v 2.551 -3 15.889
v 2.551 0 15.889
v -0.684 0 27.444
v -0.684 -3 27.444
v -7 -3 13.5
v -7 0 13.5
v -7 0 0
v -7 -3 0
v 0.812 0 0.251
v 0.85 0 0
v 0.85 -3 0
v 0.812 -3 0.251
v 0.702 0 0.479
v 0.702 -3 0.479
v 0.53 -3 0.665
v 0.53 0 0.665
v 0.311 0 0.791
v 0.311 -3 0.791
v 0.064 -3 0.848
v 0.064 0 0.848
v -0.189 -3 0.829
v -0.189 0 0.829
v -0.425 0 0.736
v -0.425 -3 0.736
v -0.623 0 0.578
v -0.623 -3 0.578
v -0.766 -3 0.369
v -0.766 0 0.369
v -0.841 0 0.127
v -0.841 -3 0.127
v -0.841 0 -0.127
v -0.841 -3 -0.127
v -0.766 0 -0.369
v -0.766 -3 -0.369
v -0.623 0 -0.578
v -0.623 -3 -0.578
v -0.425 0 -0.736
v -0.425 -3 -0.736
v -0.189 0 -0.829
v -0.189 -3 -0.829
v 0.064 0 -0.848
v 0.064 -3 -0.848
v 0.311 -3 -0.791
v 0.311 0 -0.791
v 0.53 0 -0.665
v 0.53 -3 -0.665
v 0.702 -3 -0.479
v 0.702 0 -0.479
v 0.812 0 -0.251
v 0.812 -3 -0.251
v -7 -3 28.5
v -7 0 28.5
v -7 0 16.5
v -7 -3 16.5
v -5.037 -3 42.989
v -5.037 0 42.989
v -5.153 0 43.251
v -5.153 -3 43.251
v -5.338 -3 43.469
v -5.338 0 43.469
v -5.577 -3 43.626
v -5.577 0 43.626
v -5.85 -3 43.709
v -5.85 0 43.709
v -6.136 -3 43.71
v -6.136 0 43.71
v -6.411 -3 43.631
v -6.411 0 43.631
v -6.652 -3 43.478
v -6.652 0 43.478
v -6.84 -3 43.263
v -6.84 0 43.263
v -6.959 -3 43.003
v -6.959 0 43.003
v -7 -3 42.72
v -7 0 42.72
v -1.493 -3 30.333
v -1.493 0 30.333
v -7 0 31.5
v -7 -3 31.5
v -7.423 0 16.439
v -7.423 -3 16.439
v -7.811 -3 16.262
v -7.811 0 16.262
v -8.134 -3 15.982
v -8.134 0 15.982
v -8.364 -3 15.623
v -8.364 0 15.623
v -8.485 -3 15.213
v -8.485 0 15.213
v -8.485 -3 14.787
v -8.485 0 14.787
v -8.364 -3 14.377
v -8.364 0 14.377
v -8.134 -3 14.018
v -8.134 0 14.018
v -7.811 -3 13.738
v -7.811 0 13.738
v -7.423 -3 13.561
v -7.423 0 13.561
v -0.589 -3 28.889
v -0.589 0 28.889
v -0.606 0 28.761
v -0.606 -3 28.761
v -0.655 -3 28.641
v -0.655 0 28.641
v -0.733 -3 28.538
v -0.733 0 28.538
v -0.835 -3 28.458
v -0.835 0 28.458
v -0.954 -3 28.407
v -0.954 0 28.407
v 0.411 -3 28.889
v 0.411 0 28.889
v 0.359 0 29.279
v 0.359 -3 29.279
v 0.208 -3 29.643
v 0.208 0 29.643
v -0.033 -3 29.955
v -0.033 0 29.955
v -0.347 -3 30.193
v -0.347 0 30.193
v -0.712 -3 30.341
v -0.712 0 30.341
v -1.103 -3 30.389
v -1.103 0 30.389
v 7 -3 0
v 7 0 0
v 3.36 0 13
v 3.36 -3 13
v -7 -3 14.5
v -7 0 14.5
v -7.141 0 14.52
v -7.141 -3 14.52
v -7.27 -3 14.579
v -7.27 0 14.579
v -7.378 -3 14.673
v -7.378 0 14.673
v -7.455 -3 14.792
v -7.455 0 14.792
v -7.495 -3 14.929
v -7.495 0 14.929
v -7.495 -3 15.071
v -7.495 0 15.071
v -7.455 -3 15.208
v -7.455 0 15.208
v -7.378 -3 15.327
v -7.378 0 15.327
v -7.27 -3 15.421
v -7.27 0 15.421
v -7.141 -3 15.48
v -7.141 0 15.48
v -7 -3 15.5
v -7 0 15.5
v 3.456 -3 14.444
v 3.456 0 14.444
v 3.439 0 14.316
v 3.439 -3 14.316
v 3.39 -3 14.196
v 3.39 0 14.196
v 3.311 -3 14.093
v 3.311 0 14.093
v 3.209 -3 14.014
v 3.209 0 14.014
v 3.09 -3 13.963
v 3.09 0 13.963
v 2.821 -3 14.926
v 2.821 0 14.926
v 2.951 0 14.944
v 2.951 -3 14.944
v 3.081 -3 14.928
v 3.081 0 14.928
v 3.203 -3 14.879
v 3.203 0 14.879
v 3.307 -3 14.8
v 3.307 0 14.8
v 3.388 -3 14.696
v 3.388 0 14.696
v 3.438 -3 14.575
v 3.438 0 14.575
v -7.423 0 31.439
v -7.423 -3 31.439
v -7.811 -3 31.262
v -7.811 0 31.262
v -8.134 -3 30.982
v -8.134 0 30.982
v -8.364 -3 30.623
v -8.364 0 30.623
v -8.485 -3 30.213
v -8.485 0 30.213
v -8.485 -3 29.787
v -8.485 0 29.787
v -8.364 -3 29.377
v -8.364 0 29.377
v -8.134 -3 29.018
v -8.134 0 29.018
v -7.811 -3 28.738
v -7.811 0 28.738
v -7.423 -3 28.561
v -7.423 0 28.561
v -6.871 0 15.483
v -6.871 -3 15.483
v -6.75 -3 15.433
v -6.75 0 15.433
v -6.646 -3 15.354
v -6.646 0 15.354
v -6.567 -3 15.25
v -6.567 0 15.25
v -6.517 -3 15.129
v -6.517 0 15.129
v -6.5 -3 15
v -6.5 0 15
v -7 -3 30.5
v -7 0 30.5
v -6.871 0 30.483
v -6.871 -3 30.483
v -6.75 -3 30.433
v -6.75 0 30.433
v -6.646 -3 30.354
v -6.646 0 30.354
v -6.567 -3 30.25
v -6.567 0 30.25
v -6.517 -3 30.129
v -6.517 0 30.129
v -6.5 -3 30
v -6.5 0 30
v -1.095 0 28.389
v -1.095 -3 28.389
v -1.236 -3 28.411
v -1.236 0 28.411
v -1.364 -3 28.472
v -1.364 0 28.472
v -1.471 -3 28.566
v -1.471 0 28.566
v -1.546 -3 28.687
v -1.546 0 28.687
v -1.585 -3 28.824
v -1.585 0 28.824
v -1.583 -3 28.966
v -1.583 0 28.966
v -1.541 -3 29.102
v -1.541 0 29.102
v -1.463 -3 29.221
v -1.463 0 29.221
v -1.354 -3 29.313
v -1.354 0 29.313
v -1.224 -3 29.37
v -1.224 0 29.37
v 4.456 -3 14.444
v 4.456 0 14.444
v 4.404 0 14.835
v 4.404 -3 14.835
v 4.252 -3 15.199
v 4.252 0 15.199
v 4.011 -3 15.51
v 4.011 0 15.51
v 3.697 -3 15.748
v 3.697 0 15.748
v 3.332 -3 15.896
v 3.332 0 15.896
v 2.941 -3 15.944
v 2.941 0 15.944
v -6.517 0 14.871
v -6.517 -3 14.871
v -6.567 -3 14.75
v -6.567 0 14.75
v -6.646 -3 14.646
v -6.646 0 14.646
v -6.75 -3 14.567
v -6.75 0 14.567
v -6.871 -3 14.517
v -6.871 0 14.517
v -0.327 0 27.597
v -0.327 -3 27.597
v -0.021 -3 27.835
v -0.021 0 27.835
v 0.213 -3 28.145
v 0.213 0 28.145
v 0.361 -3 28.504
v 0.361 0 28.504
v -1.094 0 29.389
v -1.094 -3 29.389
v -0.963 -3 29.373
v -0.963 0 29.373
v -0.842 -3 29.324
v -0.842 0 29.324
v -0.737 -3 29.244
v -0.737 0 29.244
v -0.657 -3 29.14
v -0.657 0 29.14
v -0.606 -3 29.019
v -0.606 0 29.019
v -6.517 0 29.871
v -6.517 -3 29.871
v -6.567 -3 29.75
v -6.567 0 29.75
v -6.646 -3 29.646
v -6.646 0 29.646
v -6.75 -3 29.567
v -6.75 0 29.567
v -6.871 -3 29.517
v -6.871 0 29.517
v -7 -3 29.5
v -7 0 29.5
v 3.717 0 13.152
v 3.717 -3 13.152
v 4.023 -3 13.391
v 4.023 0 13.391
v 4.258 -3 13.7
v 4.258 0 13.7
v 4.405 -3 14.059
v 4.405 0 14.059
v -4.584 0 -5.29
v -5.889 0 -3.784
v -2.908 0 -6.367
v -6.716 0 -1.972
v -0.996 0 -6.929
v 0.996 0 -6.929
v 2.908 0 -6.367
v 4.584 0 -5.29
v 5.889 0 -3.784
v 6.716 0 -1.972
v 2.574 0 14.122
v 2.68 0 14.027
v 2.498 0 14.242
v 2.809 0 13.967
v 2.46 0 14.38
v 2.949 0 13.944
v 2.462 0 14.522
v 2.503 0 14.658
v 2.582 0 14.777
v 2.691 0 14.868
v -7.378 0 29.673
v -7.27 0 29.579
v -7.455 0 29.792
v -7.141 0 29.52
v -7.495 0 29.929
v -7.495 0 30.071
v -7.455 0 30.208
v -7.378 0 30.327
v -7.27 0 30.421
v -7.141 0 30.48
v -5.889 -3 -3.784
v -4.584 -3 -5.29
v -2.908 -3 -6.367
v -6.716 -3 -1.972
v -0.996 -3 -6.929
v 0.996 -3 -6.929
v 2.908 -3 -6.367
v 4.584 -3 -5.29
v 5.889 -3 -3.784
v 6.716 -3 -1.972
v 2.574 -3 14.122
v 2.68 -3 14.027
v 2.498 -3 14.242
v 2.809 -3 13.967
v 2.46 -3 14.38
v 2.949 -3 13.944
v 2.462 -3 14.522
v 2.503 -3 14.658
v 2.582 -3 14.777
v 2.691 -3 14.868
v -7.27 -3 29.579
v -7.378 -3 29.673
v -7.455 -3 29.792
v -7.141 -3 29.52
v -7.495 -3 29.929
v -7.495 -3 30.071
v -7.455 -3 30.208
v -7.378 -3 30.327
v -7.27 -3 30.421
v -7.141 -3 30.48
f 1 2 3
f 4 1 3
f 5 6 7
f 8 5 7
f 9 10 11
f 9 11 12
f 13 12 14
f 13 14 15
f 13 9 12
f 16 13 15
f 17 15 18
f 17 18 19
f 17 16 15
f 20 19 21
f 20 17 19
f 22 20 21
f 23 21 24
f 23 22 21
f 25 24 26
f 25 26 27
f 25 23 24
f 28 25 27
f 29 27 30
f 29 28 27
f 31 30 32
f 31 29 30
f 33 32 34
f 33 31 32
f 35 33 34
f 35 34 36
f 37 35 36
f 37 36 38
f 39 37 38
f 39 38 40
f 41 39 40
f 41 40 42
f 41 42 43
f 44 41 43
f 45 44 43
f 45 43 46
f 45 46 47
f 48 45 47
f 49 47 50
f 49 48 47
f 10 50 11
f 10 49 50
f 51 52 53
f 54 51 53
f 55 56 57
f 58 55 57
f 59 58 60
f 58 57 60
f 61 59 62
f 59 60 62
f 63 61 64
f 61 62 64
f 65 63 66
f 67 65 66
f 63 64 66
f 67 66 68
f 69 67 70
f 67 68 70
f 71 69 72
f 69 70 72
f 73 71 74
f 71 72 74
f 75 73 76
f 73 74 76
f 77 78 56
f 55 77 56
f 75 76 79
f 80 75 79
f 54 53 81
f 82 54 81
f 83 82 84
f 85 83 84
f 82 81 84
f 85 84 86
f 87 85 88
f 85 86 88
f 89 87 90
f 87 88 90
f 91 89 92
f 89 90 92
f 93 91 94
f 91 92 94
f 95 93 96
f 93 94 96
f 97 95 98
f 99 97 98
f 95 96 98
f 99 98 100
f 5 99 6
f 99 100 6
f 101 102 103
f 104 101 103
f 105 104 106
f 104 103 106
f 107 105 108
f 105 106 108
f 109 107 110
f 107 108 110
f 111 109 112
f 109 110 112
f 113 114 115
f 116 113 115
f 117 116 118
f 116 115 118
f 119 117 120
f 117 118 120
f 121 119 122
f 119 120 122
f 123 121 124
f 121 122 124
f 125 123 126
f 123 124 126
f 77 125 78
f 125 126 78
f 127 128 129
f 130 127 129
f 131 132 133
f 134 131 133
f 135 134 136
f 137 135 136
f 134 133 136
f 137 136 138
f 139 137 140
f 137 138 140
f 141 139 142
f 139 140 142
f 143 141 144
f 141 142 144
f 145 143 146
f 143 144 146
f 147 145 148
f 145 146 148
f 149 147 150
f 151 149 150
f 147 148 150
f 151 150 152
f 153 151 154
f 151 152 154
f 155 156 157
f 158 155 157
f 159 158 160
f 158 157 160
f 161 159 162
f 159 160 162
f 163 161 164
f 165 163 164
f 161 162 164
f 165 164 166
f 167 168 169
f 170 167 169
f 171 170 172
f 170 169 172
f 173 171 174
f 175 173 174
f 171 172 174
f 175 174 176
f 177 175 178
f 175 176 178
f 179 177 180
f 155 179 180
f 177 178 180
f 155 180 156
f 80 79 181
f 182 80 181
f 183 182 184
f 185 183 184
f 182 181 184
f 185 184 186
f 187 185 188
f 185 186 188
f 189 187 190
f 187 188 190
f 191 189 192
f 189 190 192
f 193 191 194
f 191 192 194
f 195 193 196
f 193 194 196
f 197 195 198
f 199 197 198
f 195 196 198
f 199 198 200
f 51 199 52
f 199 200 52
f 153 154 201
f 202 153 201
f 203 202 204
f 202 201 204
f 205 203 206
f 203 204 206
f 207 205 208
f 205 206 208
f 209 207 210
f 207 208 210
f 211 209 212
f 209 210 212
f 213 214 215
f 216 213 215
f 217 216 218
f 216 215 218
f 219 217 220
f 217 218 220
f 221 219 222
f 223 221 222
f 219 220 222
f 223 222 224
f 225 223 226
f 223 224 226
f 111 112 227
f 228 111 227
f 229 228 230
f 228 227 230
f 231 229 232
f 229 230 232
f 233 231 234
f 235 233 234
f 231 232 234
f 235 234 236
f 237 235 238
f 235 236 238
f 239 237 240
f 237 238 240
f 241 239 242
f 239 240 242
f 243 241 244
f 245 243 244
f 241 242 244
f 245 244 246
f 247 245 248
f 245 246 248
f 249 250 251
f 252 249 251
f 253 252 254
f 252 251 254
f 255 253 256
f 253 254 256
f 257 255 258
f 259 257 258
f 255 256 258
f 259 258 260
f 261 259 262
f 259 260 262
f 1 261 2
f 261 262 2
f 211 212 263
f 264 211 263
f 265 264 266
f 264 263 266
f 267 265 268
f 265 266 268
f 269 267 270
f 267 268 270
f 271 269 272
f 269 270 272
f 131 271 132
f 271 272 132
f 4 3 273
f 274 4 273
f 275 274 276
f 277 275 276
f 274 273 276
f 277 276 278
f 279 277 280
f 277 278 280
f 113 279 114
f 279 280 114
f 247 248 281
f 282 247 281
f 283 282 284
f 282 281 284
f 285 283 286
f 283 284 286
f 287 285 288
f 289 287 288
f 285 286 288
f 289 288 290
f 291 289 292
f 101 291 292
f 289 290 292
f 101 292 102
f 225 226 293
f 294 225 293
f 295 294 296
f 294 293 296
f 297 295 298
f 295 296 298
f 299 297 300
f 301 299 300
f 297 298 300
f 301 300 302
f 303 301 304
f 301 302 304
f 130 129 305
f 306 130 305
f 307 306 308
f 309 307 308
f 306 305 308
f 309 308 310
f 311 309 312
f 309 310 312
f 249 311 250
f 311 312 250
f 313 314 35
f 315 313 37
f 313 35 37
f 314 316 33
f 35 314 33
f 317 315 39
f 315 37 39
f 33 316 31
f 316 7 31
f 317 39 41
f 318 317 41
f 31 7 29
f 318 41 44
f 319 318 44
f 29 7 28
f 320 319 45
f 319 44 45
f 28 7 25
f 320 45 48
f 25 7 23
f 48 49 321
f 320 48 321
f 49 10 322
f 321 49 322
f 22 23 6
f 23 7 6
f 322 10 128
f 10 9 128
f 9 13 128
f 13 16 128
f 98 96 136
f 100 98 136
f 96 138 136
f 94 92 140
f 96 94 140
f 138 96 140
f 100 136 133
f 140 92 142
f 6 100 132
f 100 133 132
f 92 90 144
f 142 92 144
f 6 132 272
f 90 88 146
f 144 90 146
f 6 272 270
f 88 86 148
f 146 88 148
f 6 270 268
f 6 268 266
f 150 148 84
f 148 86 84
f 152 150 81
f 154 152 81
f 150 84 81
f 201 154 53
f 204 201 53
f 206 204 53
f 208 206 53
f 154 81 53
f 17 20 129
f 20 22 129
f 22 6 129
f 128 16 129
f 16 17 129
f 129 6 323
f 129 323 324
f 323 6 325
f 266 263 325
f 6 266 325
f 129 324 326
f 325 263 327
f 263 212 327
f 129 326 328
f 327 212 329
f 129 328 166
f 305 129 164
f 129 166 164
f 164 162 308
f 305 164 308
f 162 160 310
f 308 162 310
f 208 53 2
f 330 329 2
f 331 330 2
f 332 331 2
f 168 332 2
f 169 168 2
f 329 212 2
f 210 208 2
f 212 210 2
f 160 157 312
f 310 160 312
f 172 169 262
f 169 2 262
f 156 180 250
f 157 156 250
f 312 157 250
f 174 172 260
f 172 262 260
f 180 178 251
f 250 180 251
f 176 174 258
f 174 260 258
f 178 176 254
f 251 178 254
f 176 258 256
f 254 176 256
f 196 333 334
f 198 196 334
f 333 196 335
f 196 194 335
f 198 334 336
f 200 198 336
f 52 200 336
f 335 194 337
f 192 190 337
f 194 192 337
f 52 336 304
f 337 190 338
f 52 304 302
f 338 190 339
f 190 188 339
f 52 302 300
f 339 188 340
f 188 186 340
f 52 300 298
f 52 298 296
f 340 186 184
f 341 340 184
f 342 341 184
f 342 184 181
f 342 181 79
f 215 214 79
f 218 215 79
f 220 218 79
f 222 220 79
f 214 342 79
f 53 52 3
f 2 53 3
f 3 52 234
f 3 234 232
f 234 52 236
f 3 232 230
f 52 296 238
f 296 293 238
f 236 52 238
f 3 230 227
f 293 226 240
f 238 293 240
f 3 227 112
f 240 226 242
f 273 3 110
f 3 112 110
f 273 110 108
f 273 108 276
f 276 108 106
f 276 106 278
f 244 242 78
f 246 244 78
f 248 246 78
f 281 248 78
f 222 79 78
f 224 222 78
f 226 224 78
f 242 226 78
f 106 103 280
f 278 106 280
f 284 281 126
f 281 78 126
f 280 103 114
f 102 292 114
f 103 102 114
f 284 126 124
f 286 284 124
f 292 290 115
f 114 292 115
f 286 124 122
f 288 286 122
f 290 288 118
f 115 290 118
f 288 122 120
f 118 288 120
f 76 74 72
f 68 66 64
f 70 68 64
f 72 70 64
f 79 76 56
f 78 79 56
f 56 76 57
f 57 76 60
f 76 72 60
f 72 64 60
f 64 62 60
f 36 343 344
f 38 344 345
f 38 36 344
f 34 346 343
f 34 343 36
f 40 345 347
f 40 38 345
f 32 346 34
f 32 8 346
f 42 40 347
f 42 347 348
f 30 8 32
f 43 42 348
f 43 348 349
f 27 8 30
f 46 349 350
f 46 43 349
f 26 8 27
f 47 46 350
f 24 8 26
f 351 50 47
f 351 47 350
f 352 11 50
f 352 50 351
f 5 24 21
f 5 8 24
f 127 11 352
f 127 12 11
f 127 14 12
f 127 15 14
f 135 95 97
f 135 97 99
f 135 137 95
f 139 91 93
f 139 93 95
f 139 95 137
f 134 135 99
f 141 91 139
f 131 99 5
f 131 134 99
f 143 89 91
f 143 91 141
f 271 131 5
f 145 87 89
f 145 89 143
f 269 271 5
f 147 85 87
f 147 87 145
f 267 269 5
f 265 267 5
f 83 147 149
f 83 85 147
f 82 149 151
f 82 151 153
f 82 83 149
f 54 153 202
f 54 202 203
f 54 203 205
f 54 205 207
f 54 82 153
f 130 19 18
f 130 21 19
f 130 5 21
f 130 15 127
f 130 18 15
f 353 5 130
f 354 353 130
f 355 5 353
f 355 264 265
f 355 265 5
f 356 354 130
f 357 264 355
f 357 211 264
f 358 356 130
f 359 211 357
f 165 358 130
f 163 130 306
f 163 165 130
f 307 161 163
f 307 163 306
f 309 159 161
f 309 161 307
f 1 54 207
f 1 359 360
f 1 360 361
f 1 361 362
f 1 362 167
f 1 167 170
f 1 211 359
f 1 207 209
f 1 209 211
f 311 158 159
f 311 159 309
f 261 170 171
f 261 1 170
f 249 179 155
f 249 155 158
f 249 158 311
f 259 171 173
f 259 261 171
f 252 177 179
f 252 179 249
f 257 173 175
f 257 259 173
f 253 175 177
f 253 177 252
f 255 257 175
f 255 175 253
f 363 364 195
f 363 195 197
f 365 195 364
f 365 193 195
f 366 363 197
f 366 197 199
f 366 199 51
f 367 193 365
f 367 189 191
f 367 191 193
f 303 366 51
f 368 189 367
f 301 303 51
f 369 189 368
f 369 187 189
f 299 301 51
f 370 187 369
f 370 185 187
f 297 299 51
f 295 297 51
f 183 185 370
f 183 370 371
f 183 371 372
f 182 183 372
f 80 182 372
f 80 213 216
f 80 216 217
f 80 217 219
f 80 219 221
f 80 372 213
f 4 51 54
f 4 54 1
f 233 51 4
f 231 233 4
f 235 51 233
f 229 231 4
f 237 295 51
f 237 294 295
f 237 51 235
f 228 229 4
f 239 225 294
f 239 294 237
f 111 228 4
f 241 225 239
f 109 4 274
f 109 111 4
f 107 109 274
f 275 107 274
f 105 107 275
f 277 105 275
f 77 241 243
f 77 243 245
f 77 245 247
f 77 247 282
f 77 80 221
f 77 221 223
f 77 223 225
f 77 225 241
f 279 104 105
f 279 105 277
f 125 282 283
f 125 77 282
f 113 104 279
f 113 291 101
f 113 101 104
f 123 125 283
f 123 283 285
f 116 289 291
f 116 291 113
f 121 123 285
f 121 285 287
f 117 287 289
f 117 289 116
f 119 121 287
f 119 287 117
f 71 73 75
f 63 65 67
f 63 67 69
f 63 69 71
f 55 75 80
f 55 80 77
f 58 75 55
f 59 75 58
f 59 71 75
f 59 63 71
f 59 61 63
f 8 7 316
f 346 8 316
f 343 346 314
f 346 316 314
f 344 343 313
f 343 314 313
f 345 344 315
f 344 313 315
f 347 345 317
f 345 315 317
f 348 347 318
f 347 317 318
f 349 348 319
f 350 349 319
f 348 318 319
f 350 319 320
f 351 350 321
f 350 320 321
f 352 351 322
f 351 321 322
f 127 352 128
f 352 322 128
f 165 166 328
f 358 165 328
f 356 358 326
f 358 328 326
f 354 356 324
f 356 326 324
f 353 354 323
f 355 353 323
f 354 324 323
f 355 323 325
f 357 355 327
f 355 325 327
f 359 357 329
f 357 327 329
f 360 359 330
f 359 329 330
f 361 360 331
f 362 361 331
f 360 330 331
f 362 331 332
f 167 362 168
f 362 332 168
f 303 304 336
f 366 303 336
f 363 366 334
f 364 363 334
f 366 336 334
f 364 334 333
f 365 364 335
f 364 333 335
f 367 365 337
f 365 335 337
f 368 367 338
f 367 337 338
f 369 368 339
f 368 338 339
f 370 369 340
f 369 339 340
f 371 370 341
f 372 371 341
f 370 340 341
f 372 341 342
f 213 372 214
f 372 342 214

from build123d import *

# Parameters (mm, degrees)
F0_R     = 0.85
F1_DEPTH = 3


with BuildPart() as f1:
    # F0 (on Front) → F1 (new body)
    with BuildSketch(Plane.XZ):
        with BuildLine():
            ThreePointArc((-7, 16.5), (-8.5, 15), (-7, 13.5))
            Line((-7, 13.5), (-7, 14.5))
            ThreePointArc((-7, 14.5), (-7.5, 15), (-7, 15.5))
            Line((-7, 15.5), (-7, 16.5))
        make_face()
        with BuildLine():
            ThreePointArc((-7, 31.5), (-8.5, 30), (-7, 28.5))
            Line((-7, 28.5), (-7, 29.5))
            ThreePointArc((-7, 29.5), (-7.5, 30), (-7, 30.5))
            Line((-7, 30.5), (-7, 31.5))
        make_face()
        with BuildLine():
            Line((3.09036608, 13.9629782859), (3.3599960055, 13.0000142661))
            ThreePointArc((3.3599960055, 13.0000142661), (4.1506802593, 13.5380021699), (4.4555511172, 14.4444602957))
            ThreePointArc((4.4555511172, 14.4444602957), (3.862009243, 15.6395894378), (2.5511062289, 15.8889063253))
            Line((2.5511062289, 15.8889063253), (2.8207361544, 14.9259423056))
            ThreePointArc((2.8207361544, 14.9259423056), (3.2577038258, 14.8428366764), (3.4555511172, 14.4444602957))
            ThreePointArc((3.4555511172, 14.4444602957), (3.3539274979, 14.1423075871), (3.09036608, 13.9629782859))
        make_face()
        with BuildLine():
            Line((-0.9540828028, 28.4074385816), (-0.6844528773, 27.4444745619))
            ThreePointArc((-0.6844528773, 27.4444745619), (0.1062313765, 27.9824624656), (0.4111022344, 28.8889205914))
            ThreePointArc((0.4111022344, 28.8889205914), (-0.1824396398, 30.0840497335), (-1.4933426539, 30.333366621))
            Line((-1.4933426539, 30.333366621), (-1.2237127284, 29.3704026013))
            ThreePointArc((-1.2237127284, 29.3704026013), (-0.786745057, 29.2872969721), (-0.5888977656, 28.8889205914))
            ThreePointArc((-0.5888977656, 28.8889205914), (-0.6905213849, 28.5867678828), (-0.9540828028, 28.4074385816))
        make_face()
        with BuildLine():
            ThreePointArc((5.9821958457, 3.6350148368), (-1.8874094786, 6.740748138), (-7, 0))
            ThreePointArc((-7, 0), (0, -7), (7, 0))
            Line((7, 0), (5.9821958457, 3.6350148368))
        make_face()
        Circle(F0_R, mode=Mode.SUBTRACT)
        with BuildLine():
            Line((-7, 14.5), (-7, 13.5))
            ThreePointArc((-7, 13.5), (-5.9393398282, 13.9393398282), (-5.5, 15))
            ThreePointArc((-5.5, 15), (-5.9393398282, 16.0606601718), (-7, 16.5))
            Line((-7, 16.5), (-7, 15.5))
            ThreePointArc((-7, 15.5), (-6.6464466094, 15.3535533906), (-6.5, 15))
            ThreePointArc((-6.5, 15), (-6.6464466094, 14.6464466094), (-7, 14.5))
        make_face()
        with BuildLine():
            Line((-7, 29.5), (-7, 28.5))
            ThreePointArc((-7, 28.5), (-5.9393398282, 28.9393398282), (-5.5, 30))
            ThreePointArc((-5.5, 30), (-5.9393398282, 31.0606601718), (-7, 31.5))
            Line((-7, 31.5), (-7, 30.5))
            ThreePointArc((-7, 30.5), (-6.6464466094, 30.3535533906), (-6.5, 30))
            ThreePointArc((-6.5, 30), (-6.6464466094, 29.6464466094), (-7, 29.5))
        make_face()
        with BuildLine():
            ThreePointArc((2.5511062289, 15.8889063253), (1.5111050876, 14.0400154074), (3.3599960055, 13.0000142661))
            Line((3.3599960055, 13.0000142661), (3.09036608, 13.9629782859))
            ThreePointArc((3.09036608, 13.9629782859), (2.4740691073, 14.309645333), (2.8207361544, 14.9259423056))
            Line((2.8207361544, 14.9259423056), (2.5511062289, 15.8889063253))
        make_face()
        with BuildLine():
            ThreePointArc((-1.4933426539, 30.333366621), (-2.5333437952, 28.4844757031), (-0.6844528773, 27.4444745619))
            Line((-0.6844528773, 27.4444745619), (-0.9540828028, 28.4074385816))
            ThreePointArc((-0.9540828028, 28.4074385816), (-1.5703797755, 28.7541056287), (-1.2237127284, 29.3704026013))
            Line((-1.2237127284, 29.3704026013), (-1.4933426539, 30.333366621))
        make_face()
        with BuildLine():
            Line((-7, 13.5), (-7, 0))
            ThreePointArc((-7, 0), (-1.8874094786, 6.740748138), (5.9821958457, 3.6350148368))
            Line((5.9821958457, 3.6350148368), (3.3599960055, 13.0000142661))
            ThreePointArc((3.3599960055, 13.0000142661), (1.5111050876, 14.0400154074), (2.5511062289, 15.8889063253))
            Line((2.5511062289, 15.8889063253), (-0.6844528773, 27.4444745619))
            ThreePointArc((-0.6844528773, 27.4444745619), (-2.5333437952, 28.4844757031), (-1.4933426539, 30.333366621))
            Line((-1.4933426539, 30.333366621), (-5.0370359803, 42.9894142153))
            ThreePointArc((-5.0370359803, 42.9894142153), (-6.1360808221, 43.7104820287), (-7, 42.7197842898))
            Line((-7, 42.7197842898), (-7, 31.5))
            ThreePointArc((-7, 31.5), (-5.9393398282, 31.0606601718), (-5.5, 30))
            ThreePointArc((-5.5, 30), (-5.9393398282, 28.9393398282), (-7, 28.5))
            Line((-7, 28.5), (-7, 16.5))
            ThreePointArc((-7, 16.5), (-5.9393398282, 16.0606601718), (-5.5, 15))
            ThreePointArc((-5.5, 15), (-5.9393398282, 13.9393398282), (-7, 13.5))
        make_face()
    extrude(amount=F1_DEPTH)


solid = f1.part
